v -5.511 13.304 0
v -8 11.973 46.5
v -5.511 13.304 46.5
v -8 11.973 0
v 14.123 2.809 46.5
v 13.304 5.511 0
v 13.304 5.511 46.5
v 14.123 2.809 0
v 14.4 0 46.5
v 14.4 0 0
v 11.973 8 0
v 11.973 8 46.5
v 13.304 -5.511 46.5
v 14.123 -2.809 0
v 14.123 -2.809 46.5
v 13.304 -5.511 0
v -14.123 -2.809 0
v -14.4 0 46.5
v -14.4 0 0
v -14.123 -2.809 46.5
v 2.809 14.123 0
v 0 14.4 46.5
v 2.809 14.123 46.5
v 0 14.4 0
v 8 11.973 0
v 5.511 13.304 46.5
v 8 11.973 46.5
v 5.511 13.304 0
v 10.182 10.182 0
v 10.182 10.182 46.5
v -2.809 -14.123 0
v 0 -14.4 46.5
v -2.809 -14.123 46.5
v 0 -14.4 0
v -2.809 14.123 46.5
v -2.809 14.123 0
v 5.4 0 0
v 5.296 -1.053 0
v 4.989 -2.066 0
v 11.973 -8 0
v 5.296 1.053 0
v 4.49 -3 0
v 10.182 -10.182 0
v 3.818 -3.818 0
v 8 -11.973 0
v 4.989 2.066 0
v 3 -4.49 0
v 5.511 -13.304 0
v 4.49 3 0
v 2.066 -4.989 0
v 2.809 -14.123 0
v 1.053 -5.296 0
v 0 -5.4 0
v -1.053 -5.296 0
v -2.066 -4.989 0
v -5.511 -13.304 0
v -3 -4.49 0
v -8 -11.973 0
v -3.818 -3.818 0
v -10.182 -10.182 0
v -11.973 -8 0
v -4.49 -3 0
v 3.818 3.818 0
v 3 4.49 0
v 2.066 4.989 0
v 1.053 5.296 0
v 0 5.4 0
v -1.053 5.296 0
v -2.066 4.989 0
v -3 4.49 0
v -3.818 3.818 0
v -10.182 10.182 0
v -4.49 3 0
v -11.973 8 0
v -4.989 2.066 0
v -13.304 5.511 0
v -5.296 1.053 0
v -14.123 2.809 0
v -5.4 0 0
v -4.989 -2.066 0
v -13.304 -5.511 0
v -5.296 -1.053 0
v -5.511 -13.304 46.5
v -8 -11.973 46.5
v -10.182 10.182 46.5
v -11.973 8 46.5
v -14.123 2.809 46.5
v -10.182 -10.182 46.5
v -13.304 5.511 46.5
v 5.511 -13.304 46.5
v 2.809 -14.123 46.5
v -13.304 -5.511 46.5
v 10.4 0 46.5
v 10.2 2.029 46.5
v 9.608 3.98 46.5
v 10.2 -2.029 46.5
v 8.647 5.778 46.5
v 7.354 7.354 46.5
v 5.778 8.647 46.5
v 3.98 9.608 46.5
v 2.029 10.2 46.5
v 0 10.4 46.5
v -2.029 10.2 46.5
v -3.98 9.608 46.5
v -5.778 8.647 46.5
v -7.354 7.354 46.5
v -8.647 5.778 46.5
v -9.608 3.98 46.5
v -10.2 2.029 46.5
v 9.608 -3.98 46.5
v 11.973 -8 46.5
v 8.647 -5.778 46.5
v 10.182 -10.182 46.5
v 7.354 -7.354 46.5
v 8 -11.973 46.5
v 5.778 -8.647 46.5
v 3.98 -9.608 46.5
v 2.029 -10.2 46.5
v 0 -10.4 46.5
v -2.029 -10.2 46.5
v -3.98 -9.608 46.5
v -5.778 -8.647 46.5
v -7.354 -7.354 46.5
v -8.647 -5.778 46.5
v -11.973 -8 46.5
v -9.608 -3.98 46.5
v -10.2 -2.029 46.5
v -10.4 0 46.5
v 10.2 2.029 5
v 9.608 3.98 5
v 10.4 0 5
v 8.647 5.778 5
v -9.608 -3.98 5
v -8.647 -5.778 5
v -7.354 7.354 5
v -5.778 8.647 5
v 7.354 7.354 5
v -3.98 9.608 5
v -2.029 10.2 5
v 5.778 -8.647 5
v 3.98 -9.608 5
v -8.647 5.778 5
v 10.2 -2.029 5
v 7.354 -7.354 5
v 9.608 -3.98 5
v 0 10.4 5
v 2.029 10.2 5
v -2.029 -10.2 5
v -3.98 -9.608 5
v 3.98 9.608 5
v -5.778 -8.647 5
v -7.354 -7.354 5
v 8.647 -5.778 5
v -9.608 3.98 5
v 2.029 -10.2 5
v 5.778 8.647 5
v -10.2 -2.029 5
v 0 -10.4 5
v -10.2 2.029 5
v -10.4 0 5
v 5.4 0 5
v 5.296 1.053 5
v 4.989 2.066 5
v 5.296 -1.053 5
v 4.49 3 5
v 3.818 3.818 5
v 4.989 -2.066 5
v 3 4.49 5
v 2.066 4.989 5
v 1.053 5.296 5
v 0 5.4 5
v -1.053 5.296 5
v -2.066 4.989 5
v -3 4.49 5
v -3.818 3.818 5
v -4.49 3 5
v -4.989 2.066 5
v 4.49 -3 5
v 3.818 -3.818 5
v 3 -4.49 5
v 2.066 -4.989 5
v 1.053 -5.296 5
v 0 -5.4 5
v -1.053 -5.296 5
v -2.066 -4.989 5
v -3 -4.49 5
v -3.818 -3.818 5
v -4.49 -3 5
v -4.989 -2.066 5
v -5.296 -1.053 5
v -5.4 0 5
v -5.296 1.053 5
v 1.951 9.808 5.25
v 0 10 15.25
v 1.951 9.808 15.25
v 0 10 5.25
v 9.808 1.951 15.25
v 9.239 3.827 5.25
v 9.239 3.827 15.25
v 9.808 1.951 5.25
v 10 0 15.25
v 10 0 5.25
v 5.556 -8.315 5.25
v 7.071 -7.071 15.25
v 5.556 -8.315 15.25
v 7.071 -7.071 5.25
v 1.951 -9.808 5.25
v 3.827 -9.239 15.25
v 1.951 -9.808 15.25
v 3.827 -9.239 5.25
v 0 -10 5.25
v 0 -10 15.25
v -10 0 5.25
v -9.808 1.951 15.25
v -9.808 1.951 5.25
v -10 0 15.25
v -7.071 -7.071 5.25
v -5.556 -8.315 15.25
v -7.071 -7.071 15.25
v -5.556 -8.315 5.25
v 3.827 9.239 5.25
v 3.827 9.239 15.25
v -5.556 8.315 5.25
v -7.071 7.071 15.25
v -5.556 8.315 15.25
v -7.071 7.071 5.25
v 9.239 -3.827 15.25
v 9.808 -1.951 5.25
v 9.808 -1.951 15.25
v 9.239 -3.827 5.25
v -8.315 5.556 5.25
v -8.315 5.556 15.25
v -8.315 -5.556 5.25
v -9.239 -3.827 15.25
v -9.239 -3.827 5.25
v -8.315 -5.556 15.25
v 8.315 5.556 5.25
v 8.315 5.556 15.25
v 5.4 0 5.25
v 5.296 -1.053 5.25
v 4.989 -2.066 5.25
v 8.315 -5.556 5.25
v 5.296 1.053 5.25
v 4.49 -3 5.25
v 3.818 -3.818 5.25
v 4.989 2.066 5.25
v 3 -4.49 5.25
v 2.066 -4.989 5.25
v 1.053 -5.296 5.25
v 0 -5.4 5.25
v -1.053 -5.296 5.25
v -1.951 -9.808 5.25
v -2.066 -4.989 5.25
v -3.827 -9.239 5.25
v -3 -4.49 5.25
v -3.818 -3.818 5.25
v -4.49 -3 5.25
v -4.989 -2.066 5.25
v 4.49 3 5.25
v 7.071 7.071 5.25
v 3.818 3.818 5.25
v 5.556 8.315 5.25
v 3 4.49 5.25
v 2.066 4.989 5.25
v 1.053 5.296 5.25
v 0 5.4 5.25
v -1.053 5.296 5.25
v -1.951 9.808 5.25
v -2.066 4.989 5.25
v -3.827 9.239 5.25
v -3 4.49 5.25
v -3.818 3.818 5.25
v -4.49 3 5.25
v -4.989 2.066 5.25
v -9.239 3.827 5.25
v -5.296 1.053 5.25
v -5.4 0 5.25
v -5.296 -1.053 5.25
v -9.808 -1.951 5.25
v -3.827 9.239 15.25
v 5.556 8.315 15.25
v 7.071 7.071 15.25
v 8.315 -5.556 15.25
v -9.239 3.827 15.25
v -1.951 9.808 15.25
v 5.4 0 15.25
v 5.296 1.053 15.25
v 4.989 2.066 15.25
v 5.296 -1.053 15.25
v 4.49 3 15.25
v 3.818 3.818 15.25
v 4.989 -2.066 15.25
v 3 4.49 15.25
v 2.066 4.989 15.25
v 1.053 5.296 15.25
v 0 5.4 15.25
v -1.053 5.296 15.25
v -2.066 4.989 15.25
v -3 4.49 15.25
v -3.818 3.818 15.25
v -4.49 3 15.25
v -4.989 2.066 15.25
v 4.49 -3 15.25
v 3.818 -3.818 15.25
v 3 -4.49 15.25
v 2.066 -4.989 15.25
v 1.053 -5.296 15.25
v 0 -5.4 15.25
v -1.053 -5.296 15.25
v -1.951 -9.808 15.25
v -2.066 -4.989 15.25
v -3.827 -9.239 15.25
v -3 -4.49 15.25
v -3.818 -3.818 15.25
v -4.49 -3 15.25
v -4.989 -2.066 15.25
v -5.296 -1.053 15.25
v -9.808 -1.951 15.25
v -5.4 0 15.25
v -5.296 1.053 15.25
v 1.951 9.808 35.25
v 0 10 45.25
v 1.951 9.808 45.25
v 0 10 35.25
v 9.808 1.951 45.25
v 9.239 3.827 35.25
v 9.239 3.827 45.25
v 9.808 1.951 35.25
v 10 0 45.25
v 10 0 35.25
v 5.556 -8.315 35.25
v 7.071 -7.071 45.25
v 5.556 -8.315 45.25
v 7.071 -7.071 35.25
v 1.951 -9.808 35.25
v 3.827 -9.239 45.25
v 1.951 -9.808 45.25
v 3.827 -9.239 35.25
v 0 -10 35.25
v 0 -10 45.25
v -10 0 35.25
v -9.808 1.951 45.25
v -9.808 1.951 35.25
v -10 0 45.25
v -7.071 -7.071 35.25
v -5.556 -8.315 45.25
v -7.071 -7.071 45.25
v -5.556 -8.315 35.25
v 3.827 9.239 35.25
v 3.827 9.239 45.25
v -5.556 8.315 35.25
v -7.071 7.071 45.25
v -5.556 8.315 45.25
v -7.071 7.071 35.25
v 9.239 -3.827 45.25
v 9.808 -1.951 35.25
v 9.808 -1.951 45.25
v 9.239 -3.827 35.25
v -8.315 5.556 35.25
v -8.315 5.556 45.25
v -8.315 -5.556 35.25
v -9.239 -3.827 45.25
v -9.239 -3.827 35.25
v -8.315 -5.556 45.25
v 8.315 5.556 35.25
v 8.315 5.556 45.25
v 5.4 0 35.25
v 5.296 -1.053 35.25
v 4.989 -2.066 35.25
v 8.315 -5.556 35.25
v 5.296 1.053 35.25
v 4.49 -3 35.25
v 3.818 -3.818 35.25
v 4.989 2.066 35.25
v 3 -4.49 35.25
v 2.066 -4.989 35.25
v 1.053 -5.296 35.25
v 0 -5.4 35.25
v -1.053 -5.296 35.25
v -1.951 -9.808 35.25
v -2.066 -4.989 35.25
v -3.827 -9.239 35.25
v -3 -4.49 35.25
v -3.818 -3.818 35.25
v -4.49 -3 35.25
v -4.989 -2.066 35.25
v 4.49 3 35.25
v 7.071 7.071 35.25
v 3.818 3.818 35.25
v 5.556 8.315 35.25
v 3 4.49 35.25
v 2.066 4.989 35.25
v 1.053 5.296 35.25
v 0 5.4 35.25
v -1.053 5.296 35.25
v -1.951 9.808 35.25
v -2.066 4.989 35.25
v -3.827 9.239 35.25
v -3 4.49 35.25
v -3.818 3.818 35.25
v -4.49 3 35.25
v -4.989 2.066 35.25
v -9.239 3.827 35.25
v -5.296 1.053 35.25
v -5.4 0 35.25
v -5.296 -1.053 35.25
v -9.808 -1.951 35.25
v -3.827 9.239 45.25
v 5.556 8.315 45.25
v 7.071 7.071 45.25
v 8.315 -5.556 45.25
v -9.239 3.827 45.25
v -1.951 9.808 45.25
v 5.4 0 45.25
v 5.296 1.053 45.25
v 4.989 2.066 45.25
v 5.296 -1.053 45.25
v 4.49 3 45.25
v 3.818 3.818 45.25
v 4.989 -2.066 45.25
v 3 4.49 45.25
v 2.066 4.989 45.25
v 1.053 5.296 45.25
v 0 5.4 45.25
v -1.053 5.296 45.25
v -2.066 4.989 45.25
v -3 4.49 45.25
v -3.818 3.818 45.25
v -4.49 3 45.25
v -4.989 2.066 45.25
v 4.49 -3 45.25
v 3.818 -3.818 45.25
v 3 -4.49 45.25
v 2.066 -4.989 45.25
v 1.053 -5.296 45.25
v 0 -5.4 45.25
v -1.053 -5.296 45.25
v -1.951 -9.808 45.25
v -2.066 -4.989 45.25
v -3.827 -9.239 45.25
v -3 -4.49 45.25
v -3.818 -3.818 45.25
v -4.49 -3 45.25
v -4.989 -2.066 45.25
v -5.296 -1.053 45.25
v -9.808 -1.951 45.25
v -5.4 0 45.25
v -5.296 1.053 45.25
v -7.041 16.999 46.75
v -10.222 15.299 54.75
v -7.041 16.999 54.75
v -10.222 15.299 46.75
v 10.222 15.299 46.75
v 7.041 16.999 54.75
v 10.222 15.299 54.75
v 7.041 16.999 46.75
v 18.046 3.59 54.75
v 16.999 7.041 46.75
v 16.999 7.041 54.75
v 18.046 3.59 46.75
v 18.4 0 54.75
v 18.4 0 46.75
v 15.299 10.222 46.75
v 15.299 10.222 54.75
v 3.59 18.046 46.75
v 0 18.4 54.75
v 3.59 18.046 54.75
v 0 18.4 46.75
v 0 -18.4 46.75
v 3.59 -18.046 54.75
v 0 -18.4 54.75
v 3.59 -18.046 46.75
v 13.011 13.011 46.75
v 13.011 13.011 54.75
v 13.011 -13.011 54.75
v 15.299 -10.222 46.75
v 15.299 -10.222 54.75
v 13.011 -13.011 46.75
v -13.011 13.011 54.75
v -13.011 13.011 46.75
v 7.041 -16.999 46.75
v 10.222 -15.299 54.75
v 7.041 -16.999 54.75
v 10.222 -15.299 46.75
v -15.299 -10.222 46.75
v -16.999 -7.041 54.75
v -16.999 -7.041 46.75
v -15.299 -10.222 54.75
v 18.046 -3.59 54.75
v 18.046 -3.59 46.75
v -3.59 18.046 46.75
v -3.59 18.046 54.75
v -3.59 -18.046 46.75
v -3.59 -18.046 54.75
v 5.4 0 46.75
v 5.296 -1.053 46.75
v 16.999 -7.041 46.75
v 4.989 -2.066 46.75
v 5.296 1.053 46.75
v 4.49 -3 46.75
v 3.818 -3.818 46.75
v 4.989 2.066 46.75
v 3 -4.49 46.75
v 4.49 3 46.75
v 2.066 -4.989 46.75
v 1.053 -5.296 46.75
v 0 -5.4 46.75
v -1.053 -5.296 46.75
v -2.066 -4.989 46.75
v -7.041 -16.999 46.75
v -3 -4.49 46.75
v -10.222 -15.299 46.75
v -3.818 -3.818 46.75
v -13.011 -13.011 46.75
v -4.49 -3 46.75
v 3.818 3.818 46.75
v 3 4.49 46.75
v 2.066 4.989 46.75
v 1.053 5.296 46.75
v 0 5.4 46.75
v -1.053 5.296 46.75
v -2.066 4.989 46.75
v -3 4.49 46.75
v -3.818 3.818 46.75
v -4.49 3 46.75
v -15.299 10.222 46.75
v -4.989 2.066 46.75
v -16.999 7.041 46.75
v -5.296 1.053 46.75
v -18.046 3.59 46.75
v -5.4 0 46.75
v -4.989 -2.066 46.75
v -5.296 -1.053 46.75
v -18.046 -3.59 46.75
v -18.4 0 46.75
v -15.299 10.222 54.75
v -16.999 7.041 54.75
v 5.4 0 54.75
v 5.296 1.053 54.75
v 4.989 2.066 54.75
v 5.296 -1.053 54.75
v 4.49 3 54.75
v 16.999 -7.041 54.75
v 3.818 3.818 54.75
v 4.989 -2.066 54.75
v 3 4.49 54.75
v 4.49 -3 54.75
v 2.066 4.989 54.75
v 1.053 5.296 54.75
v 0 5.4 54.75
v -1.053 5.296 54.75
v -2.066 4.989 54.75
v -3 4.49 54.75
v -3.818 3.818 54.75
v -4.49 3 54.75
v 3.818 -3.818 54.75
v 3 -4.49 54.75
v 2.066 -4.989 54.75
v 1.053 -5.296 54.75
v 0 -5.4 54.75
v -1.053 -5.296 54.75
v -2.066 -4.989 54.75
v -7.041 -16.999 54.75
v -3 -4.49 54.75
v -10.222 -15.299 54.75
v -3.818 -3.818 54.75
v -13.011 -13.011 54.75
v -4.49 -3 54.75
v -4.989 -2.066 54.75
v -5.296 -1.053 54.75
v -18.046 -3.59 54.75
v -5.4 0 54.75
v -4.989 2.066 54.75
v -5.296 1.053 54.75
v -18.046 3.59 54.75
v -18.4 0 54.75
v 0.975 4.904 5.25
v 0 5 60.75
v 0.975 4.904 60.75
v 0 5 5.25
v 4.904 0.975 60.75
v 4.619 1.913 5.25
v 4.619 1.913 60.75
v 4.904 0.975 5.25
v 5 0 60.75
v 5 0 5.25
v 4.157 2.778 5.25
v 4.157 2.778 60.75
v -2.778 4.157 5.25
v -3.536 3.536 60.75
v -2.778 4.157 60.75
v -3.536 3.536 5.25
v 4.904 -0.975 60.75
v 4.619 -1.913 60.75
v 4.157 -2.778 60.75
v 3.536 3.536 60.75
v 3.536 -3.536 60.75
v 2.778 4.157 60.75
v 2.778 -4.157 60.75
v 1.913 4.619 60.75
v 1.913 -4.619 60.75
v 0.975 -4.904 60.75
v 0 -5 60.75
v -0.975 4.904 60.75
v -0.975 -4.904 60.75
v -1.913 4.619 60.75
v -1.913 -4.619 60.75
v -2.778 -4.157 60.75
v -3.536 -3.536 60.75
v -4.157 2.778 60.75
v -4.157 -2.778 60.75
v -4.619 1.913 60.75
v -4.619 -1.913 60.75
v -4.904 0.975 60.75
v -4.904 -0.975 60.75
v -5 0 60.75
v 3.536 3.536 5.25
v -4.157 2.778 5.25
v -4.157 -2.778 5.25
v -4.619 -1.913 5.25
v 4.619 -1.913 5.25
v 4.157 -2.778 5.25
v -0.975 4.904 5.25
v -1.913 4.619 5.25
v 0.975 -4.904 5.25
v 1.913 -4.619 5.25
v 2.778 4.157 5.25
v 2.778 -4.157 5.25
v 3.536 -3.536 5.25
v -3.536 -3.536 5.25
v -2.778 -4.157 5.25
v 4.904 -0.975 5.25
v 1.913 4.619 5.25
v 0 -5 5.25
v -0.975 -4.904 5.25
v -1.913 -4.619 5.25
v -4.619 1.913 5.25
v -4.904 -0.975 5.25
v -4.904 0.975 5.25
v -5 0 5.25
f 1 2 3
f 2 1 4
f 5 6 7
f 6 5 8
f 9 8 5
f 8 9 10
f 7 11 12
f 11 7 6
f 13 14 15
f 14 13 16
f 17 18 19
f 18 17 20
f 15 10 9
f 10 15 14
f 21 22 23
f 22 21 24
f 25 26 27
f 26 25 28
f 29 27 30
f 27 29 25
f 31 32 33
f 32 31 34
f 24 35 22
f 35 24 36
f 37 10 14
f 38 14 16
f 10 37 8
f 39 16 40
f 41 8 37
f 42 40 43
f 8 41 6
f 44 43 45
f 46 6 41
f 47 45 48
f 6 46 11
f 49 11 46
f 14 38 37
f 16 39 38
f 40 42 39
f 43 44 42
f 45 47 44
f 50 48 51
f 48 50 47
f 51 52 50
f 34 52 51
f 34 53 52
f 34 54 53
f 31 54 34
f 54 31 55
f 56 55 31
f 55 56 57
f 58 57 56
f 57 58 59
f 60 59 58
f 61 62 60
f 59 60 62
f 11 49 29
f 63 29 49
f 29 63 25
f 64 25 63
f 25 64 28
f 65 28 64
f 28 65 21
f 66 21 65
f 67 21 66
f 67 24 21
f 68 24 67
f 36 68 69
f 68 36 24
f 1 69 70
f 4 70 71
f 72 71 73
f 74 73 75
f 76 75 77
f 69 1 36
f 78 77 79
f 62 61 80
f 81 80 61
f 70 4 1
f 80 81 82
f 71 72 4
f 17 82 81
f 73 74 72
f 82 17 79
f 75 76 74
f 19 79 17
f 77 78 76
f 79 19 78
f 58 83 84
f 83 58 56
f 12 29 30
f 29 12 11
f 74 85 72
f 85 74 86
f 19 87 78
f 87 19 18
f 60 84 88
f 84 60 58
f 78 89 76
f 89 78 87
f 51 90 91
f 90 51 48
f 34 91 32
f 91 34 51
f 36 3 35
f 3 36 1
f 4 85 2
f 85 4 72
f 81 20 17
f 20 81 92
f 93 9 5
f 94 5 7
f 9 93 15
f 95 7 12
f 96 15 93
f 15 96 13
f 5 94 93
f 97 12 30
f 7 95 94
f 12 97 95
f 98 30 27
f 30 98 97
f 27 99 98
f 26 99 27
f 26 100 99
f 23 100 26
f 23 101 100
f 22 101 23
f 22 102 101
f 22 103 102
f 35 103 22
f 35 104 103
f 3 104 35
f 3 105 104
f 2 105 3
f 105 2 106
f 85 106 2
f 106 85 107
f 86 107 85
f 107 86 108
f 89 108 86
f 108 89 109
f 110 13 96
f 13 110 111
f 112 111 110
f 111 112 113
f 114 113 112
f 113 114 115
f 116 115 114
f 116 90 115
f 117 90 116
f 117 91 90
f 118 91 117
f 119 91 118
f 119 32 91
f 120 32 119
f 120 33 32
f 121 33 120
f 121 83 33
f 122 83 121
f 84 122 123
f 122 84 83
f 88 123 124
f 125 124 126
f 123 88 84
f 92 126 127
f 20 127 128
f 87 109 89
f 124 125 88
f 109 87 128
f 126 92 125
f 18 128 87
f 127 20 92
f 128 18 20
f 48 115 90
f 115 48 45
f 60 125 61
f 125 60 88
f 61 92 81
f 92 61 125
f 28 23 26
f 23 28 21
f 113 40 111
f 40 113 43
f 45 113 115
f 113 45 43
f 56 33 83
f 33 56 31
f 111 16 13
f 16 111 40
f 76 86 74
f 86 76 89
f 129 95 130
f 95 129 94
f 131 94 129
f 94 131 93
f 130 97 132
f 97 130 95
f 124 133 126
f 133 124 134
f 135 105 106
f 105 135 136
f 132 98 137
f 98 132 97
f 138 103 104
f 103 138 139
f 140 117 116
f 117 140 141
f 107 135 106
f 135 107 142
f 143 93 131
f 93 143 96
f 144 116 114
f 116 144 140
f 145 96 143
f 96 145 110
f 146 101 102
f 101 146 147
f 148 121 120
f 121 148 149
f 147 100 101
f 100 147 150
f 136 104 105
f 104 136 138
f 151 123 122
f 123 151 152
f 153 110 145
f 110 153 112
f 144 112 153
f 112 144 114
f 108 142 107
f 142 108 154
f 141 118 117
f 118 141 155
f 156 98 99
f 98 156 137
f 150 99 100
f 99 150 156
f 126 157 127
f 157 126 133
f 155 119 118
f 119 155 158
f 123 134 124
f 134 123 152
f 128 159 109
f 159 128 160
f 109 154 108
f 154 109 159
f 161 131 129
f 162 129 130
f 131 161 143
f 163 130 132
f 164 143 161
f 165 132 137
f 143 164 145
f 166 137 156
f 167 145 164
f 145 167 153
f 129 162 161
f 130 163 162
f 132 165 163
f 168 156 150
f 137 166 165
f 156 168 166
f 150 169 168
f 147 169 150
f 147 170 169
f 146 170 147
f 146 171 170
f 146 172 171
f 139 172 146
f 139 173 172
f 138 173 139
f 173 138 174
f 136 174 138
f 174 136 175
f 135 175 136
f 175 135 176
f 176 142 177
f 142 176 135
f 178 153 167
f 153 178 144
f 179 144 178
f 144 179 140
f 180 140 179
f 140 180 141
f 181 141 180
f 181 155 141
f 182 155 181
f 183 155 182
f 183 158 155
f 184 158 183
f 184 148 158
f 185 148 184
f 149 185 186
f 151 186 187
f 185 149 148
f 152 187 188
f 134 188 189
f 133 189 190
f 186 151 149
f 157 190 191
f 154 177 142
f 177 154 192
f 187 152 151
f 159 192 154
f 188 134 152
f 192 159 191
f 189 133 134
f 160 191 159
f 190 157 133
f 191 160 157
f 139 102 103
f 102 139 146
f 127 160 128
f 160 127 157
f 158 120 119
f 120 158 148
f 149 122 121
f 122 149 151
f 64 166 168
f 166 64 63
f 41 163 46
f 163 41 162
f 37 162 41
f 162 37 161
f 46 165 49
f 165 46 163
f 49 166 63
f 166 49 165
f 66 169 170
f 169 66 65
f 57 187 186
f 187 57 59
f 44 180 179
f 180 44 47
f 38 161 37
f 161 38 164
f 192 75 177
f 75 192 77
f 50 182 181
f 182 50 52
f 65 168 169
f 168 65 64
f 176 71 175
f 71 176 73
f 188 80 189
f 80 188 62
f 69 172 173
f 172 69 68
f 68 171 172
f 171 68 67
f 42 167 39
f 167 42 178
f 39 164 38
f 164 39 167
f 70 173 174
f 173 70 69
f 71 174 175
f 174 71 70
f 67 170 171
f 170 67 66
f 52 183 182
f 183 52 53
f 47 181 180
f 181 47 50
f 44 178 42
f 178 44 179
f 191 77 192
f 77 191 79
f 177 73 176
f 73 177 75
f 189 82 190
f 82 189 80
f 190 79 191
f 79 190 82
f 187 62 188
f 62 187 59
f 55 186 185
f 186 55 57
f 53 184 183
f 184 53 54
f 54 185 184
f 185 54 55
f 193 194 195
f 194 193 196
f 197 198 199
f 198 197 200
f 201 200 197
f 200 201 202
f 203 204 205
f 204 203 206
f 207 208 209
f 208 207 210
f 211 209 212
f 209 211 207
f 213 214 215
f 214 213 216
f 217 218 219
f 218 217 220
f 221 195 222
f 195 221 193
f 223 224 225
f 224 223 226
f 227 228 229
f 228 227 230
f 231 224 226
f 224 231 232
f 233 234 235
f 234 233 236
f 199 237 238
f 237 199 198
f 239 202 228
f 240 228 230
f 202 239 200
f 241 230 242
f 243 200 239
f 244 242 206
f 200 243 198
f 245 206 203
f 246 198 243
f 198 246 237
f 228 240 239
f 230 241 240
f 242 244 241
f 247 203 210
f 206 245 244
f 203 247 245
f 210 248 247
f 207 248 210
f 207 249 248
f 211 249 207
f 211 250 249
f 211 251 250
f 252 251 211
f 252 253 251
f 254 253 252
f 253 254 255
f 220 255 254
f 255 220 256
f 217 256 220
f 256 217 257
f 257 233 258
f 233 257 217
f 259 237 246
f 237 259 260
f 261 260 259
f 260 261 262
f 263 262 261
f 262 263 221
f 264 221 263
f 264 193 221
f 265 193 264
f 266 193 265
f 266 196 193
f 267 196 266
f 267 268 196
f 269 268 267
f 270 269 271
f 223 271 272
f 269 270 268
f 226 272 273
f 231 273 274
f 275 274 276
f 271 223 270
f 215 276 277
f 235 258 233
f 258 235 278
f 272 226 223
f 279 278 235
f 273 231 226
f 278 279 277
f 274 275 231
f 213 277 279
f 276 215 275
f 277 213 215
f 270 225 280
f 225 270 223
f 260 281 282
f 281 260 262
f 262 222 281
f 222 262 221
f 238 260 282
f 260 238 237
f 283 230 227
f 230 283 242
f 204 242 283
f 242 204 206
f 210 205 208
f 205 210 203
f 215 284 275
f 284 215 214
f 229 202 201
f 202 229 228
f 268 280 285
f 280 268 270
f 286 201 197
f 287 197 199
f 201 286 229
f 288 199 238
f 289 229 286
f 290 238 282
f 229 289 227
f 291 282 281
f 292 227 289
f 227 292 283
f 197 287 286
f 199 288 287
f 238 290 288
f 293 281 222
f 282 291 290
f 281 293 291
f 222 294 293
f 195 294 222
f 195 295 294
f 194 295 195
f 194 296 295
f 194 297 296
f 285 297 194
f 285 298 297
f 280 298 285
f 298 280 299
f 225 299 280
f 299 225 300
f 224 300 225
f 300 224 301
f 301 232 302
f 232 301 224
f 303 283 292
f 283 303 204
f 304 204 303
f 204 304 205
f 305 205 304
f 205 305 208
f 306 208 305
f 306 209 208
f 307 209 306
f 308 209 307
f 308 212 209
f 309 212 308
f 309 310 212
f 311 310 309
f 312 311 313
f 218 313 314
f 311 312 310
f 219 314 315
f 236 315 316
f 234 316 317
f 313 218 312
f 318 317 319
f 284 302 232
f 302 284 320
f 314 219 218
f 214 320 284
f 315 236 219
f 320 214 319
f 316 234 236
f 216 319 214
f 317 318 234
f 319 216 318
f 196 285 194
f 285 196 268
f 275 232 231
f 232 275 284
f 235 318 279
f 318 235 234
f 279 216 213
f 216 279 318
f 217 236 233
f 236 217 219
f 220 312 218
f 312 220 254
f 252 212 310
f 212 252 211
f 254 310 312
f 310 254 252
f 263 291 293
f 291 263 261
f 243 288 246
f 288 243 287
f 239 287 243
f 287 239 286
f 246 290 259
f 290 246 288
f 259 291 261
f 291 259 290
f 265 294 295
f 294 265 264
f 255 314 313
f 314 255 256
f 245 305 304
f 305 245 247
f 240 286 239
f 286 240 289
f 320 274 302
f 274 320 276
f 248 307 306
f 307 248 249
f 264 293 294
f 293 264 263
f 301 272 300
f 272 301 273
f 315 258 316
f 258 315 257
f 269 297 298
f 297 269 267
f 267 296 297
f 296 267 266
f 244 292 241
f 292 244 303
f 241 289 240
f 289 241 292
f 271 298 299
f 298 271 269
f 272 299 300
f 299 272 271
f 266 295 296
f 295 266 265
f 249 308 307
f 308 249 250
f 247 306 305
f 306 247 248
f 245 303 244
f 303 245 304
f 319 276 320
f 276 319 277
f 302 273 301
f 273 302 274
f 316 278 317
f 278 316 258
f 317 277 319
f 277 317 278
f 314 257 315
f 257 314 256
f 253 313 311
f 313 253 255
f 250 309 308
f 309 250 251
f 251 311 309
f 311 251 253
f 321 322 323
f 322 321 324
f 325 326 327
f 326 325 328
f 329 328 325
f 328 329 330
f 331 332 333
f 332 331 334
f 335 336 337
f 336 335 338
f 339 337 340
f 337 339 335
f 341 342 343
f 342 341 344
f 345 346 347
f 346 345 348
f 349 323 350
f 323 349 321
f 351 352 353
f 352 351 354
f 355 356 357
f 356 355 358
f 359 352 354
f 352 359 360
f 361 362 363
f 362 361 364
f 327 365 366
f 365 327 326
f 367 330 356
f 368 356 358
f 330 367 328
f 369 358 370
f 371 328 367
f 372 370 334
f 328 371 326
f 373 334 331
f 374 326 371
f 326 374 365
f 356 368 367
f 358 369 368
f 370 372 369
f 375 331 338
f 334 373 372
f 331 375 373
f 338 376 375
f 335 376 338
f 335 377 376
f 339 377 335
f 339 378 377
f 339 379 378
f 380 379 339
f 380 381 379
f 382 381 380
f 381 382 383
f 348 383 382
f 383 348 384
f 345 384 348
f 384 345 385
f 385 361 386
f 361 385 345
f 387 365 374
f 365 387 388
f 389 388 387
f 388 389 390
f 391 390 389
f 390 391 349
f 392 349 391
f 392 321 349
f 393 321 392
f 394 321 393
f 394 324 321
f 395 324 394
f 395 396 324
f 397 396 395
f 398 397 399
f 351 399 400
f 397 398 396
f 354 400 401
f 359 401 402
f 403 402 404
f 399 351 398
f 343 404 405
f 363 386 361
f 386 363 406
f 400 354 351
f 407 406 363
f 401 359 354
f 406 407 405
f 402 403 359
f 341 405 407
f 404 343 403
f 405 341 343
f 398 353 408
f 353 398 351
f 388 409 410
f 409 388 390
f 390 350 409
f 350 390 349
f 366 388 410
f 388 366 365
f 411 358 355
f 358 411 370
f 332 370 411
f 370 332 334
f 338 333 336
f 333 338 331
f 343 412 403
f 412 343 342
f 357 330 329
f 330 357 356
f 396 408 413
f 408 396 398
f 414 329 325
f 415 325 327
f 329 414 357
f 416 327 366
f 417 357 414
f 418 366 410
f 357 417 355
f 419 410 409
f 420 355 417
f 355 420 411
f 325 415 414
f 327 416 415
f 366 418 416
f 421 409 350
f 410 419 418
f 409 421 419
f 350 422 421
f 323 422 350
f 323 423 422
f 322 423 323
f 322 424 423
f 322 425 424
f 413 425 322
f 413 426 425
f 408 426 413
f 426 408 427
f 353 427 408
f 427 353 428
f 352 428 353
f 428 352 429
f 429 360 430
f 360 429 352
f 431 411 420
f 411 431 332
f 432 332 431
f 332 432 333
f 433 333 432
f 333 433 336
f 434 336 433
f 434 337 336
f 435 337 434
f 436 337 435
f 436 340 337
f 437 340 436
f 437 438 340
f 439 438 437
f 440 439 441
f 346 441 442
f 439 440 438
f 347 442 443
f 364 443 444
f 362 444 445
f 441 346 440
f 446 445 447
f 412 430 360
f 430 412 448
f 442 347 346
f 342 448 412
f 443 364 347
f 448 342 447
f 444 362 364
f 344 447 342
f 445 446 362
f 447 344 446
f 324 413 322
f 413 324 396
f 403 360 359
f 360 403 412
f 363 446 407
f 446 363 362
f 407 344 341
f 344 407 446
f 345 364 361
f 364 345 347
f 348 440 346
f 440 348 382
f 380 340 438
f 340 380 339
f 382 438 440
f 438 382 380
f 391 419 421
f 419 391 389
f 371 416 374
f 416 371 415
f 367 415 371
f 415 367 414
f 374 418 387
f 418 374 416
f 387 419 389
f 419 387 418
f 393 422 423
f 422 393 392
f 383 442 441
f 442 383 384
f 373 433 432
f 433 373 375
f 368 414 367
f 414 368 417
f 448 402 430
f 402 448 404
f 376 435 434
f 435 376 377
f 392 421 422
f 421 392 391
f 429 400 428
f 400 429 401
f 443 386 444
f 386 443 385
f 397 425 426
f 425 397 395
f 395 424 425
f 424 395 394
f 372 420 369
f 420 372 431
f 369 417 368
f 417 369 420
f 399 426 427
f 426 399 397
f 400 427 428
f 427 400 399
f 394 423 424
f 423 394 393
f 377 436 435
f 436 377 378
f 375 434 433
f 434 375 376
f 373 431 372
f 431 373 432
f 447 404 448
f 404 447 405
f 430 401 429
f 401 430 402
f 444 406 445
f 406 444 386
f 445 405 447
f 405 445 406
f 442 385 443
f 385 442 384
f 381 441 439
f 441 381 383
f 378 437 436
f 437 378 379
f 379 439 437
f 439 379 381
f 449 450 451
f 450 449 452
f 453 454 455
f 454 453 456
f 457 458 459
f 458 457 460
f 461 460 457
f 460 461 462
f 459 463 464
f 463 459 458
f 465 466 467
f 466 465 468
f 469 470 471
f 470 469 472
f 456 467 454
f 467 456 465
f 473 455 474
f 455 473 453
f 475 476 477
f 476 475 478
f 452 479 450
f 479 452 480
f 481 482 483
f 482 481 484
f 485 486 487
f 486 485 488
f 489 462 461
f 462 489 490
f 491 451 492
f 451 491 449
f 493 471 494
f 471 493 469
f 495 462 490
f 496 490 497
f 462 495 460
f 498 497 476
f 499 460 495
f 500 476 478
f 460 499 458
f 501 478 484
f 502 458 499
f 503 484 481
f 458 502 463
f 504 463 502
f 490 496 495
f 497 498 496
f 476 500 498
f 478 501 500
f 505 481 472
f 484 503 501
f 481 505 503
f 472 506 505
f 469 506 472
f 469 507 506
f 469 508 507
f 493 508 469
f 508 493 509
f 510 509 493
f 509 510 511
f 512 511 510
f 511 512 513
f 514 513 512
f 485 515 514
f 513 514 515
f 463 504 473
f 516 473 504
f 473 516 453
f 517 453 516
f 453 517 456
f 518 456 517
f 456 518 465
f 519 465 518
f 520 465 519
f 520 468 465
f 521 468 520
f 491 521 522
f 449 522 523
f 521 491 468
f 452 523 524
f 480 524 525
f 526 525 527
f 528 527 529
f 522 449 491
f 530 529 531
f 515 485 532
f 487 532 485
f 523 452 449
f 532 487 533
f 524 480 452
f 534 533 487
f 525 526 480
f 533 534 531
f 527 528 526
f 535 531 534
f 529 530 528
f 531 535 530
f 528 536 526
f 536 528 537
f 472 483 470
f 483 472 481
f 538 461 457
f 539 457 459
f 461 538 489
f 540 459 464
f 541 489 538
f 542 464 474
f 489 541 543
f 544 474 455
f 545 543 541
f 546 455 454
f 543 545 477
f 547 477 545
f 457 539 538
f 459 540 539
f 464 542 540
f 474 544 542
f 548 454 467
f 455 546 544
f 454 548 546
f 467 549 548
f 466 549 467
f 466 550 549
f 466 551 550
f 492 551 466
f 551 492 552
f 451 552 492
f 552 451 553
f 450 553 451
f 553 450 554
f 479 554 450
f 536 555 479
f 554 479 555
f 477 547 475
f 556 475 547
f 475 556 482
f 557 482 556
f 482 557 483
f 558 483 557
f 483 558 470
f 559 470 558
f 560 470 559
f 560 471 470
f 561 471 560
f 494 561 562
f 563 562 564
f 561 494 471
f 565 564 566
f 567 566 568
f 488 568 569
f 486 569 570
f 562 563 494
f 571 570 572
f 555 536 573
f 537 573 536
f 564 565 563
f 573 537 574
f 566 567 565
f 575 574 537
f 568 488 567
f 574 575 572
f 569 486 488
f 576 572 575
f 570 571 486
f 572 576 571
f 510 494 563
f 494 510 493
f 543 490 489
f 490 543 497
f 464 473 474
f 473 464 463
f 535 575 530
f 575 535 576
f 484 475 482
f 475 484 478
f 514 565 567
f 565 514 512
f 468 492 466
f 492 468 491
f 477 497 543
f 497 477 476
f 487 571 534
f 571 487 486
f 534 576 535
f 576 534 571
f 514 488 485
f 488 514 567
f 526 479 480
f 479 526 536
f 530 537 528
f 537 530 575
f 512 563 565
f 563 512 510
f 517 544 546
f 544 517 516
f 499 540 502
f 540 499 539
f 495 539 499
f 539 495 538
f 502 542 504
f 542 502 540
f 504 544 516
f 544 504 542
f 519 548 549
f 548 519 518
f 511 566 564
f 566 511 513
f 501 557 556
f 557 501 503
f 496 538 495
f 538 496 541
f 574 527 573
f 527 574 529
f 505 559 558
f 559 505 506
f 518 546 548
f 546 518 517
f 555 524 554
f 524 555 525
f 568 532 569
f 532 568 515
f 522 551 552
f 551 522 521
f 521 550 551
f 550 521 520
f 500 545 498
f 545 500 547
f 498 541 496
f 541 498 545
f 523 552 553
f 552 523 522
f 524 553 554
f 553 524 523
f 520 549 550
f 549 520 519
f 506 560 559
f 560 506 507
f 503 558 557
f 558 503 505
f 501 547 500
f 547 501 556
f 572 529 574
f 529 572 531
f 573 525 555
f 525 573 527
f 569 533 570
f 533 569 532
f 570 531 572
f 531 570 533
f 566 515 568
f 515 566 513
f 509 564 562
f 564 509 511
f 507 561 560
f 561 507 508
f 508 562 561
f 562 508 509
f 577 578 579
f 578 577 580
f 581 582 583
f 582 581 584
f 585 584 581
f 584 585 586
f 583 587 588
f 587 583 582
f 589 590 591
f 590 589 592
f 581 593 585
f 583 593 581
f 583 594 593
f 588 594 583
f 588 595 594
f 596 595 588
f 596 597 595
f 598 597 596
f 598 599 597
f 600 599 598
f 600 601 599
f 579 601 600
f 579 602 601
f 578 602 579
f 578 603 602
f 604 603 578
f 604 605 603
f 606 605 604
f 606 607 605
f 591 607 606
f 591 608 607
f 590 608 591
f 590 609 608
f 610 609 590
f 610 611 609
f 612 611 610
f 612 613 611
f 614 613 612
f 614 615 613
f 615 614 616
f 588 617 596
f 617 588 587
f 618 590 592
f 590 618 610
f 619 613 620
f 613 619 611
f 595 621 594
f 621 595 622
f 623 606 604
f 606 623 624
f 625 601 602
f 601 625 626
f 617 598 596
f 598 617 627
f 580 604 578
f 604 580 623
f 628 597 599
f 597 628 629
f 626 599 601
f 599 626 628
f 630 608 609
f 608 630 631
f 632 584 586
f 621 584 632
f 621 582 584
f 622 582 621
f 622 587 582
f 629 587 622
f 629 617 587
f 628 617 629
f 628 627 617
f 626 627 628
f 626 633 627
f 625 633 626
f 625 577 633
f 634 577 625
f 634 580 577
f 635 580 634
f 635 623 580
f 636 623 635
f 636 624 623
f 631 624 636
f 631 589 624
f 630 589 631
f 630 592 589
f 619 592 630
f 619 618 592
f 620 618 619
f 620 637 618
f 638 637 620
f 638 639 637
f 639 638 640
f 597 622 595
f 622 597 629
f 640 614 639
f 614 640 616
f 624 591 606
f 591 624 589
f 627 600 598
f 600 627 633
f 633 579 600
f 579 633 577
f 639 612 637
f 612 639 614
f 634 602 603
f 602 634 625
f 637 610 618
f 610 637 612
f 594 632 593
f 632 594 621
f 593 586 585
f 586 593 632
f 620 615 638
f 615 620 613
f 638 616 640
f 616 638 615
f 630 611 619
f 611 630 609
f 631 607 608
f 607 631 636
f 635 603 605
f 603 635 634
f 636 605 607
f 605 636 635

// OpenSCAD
$fn = 32;

// ------------------------------------------------------------------------
// Shaft station: cup d28.8 x 46.5 mm, shaft d10
// Every part is its own module, assembly() places every instance.
// ------------------------------------------------------------------------

// --- part 1 ---
module housing_cup() {
  difference() {
    cylinder(h = 46.5, d = 28.8);
    translate([0, 0, 5]) cylinder(h = 42.5, d = 20.8);
    translate([0, 0, -1]) cylinder(h = 7, d = 10.8);
  }
}

// --- part 2 ---
module bearing_lower() {
  difference() {
      translate([0, 0, 0]) cylinder(h = 10, d = 20);
      translate([0, 0, -1]) cylinder(h = 12, d = 10.8);
    }
}

// --- part 3 ---
module bearing_upper() {
  difference() {
      translate([0, 0, 0]) cylinder(h = 10, d = 20);
      translate([0, 0, -1]) cylinder(h = 12, d = 10.8);
    }
}

// --- part 4 ---
module station_shaft() {
  translate([0, 0, -27.75]) cylinder(h = 55.5, d = 10);
}

// --- part 5 ---
module station_cover() {
  difference() {
    cylinder(h = 8, d = 36.8);
    translate([0, 0, -1]) cylinder(h = 10, d = 10.8);
  }
}

// --- assembly ---
module assembly() {
  color([0.80, 0.24, 0.20]) translate([0, 0, 0]) rotate([0, 0, 0]) housing_cup();
  color([0.20, 0.45, 0.75]) translate([0, 0, 5.25]) rotate([0, 0, 0]) bearing_lower();
  color([0.25, 0.62, 0.32]) translate([0, 0, 35.25]) rotate([0, 0, 0]) bearing_upper();
  color([0.92, 0.70, 0.18]) translate([0, 0, 33]) rotate([0, 0, 0]) station_shaft();
  color([0.58, 0.35, 0.70]) translate([0, 0, 46.75]) rotate([0, 0, 0]) station_cover();
}

assembly();
